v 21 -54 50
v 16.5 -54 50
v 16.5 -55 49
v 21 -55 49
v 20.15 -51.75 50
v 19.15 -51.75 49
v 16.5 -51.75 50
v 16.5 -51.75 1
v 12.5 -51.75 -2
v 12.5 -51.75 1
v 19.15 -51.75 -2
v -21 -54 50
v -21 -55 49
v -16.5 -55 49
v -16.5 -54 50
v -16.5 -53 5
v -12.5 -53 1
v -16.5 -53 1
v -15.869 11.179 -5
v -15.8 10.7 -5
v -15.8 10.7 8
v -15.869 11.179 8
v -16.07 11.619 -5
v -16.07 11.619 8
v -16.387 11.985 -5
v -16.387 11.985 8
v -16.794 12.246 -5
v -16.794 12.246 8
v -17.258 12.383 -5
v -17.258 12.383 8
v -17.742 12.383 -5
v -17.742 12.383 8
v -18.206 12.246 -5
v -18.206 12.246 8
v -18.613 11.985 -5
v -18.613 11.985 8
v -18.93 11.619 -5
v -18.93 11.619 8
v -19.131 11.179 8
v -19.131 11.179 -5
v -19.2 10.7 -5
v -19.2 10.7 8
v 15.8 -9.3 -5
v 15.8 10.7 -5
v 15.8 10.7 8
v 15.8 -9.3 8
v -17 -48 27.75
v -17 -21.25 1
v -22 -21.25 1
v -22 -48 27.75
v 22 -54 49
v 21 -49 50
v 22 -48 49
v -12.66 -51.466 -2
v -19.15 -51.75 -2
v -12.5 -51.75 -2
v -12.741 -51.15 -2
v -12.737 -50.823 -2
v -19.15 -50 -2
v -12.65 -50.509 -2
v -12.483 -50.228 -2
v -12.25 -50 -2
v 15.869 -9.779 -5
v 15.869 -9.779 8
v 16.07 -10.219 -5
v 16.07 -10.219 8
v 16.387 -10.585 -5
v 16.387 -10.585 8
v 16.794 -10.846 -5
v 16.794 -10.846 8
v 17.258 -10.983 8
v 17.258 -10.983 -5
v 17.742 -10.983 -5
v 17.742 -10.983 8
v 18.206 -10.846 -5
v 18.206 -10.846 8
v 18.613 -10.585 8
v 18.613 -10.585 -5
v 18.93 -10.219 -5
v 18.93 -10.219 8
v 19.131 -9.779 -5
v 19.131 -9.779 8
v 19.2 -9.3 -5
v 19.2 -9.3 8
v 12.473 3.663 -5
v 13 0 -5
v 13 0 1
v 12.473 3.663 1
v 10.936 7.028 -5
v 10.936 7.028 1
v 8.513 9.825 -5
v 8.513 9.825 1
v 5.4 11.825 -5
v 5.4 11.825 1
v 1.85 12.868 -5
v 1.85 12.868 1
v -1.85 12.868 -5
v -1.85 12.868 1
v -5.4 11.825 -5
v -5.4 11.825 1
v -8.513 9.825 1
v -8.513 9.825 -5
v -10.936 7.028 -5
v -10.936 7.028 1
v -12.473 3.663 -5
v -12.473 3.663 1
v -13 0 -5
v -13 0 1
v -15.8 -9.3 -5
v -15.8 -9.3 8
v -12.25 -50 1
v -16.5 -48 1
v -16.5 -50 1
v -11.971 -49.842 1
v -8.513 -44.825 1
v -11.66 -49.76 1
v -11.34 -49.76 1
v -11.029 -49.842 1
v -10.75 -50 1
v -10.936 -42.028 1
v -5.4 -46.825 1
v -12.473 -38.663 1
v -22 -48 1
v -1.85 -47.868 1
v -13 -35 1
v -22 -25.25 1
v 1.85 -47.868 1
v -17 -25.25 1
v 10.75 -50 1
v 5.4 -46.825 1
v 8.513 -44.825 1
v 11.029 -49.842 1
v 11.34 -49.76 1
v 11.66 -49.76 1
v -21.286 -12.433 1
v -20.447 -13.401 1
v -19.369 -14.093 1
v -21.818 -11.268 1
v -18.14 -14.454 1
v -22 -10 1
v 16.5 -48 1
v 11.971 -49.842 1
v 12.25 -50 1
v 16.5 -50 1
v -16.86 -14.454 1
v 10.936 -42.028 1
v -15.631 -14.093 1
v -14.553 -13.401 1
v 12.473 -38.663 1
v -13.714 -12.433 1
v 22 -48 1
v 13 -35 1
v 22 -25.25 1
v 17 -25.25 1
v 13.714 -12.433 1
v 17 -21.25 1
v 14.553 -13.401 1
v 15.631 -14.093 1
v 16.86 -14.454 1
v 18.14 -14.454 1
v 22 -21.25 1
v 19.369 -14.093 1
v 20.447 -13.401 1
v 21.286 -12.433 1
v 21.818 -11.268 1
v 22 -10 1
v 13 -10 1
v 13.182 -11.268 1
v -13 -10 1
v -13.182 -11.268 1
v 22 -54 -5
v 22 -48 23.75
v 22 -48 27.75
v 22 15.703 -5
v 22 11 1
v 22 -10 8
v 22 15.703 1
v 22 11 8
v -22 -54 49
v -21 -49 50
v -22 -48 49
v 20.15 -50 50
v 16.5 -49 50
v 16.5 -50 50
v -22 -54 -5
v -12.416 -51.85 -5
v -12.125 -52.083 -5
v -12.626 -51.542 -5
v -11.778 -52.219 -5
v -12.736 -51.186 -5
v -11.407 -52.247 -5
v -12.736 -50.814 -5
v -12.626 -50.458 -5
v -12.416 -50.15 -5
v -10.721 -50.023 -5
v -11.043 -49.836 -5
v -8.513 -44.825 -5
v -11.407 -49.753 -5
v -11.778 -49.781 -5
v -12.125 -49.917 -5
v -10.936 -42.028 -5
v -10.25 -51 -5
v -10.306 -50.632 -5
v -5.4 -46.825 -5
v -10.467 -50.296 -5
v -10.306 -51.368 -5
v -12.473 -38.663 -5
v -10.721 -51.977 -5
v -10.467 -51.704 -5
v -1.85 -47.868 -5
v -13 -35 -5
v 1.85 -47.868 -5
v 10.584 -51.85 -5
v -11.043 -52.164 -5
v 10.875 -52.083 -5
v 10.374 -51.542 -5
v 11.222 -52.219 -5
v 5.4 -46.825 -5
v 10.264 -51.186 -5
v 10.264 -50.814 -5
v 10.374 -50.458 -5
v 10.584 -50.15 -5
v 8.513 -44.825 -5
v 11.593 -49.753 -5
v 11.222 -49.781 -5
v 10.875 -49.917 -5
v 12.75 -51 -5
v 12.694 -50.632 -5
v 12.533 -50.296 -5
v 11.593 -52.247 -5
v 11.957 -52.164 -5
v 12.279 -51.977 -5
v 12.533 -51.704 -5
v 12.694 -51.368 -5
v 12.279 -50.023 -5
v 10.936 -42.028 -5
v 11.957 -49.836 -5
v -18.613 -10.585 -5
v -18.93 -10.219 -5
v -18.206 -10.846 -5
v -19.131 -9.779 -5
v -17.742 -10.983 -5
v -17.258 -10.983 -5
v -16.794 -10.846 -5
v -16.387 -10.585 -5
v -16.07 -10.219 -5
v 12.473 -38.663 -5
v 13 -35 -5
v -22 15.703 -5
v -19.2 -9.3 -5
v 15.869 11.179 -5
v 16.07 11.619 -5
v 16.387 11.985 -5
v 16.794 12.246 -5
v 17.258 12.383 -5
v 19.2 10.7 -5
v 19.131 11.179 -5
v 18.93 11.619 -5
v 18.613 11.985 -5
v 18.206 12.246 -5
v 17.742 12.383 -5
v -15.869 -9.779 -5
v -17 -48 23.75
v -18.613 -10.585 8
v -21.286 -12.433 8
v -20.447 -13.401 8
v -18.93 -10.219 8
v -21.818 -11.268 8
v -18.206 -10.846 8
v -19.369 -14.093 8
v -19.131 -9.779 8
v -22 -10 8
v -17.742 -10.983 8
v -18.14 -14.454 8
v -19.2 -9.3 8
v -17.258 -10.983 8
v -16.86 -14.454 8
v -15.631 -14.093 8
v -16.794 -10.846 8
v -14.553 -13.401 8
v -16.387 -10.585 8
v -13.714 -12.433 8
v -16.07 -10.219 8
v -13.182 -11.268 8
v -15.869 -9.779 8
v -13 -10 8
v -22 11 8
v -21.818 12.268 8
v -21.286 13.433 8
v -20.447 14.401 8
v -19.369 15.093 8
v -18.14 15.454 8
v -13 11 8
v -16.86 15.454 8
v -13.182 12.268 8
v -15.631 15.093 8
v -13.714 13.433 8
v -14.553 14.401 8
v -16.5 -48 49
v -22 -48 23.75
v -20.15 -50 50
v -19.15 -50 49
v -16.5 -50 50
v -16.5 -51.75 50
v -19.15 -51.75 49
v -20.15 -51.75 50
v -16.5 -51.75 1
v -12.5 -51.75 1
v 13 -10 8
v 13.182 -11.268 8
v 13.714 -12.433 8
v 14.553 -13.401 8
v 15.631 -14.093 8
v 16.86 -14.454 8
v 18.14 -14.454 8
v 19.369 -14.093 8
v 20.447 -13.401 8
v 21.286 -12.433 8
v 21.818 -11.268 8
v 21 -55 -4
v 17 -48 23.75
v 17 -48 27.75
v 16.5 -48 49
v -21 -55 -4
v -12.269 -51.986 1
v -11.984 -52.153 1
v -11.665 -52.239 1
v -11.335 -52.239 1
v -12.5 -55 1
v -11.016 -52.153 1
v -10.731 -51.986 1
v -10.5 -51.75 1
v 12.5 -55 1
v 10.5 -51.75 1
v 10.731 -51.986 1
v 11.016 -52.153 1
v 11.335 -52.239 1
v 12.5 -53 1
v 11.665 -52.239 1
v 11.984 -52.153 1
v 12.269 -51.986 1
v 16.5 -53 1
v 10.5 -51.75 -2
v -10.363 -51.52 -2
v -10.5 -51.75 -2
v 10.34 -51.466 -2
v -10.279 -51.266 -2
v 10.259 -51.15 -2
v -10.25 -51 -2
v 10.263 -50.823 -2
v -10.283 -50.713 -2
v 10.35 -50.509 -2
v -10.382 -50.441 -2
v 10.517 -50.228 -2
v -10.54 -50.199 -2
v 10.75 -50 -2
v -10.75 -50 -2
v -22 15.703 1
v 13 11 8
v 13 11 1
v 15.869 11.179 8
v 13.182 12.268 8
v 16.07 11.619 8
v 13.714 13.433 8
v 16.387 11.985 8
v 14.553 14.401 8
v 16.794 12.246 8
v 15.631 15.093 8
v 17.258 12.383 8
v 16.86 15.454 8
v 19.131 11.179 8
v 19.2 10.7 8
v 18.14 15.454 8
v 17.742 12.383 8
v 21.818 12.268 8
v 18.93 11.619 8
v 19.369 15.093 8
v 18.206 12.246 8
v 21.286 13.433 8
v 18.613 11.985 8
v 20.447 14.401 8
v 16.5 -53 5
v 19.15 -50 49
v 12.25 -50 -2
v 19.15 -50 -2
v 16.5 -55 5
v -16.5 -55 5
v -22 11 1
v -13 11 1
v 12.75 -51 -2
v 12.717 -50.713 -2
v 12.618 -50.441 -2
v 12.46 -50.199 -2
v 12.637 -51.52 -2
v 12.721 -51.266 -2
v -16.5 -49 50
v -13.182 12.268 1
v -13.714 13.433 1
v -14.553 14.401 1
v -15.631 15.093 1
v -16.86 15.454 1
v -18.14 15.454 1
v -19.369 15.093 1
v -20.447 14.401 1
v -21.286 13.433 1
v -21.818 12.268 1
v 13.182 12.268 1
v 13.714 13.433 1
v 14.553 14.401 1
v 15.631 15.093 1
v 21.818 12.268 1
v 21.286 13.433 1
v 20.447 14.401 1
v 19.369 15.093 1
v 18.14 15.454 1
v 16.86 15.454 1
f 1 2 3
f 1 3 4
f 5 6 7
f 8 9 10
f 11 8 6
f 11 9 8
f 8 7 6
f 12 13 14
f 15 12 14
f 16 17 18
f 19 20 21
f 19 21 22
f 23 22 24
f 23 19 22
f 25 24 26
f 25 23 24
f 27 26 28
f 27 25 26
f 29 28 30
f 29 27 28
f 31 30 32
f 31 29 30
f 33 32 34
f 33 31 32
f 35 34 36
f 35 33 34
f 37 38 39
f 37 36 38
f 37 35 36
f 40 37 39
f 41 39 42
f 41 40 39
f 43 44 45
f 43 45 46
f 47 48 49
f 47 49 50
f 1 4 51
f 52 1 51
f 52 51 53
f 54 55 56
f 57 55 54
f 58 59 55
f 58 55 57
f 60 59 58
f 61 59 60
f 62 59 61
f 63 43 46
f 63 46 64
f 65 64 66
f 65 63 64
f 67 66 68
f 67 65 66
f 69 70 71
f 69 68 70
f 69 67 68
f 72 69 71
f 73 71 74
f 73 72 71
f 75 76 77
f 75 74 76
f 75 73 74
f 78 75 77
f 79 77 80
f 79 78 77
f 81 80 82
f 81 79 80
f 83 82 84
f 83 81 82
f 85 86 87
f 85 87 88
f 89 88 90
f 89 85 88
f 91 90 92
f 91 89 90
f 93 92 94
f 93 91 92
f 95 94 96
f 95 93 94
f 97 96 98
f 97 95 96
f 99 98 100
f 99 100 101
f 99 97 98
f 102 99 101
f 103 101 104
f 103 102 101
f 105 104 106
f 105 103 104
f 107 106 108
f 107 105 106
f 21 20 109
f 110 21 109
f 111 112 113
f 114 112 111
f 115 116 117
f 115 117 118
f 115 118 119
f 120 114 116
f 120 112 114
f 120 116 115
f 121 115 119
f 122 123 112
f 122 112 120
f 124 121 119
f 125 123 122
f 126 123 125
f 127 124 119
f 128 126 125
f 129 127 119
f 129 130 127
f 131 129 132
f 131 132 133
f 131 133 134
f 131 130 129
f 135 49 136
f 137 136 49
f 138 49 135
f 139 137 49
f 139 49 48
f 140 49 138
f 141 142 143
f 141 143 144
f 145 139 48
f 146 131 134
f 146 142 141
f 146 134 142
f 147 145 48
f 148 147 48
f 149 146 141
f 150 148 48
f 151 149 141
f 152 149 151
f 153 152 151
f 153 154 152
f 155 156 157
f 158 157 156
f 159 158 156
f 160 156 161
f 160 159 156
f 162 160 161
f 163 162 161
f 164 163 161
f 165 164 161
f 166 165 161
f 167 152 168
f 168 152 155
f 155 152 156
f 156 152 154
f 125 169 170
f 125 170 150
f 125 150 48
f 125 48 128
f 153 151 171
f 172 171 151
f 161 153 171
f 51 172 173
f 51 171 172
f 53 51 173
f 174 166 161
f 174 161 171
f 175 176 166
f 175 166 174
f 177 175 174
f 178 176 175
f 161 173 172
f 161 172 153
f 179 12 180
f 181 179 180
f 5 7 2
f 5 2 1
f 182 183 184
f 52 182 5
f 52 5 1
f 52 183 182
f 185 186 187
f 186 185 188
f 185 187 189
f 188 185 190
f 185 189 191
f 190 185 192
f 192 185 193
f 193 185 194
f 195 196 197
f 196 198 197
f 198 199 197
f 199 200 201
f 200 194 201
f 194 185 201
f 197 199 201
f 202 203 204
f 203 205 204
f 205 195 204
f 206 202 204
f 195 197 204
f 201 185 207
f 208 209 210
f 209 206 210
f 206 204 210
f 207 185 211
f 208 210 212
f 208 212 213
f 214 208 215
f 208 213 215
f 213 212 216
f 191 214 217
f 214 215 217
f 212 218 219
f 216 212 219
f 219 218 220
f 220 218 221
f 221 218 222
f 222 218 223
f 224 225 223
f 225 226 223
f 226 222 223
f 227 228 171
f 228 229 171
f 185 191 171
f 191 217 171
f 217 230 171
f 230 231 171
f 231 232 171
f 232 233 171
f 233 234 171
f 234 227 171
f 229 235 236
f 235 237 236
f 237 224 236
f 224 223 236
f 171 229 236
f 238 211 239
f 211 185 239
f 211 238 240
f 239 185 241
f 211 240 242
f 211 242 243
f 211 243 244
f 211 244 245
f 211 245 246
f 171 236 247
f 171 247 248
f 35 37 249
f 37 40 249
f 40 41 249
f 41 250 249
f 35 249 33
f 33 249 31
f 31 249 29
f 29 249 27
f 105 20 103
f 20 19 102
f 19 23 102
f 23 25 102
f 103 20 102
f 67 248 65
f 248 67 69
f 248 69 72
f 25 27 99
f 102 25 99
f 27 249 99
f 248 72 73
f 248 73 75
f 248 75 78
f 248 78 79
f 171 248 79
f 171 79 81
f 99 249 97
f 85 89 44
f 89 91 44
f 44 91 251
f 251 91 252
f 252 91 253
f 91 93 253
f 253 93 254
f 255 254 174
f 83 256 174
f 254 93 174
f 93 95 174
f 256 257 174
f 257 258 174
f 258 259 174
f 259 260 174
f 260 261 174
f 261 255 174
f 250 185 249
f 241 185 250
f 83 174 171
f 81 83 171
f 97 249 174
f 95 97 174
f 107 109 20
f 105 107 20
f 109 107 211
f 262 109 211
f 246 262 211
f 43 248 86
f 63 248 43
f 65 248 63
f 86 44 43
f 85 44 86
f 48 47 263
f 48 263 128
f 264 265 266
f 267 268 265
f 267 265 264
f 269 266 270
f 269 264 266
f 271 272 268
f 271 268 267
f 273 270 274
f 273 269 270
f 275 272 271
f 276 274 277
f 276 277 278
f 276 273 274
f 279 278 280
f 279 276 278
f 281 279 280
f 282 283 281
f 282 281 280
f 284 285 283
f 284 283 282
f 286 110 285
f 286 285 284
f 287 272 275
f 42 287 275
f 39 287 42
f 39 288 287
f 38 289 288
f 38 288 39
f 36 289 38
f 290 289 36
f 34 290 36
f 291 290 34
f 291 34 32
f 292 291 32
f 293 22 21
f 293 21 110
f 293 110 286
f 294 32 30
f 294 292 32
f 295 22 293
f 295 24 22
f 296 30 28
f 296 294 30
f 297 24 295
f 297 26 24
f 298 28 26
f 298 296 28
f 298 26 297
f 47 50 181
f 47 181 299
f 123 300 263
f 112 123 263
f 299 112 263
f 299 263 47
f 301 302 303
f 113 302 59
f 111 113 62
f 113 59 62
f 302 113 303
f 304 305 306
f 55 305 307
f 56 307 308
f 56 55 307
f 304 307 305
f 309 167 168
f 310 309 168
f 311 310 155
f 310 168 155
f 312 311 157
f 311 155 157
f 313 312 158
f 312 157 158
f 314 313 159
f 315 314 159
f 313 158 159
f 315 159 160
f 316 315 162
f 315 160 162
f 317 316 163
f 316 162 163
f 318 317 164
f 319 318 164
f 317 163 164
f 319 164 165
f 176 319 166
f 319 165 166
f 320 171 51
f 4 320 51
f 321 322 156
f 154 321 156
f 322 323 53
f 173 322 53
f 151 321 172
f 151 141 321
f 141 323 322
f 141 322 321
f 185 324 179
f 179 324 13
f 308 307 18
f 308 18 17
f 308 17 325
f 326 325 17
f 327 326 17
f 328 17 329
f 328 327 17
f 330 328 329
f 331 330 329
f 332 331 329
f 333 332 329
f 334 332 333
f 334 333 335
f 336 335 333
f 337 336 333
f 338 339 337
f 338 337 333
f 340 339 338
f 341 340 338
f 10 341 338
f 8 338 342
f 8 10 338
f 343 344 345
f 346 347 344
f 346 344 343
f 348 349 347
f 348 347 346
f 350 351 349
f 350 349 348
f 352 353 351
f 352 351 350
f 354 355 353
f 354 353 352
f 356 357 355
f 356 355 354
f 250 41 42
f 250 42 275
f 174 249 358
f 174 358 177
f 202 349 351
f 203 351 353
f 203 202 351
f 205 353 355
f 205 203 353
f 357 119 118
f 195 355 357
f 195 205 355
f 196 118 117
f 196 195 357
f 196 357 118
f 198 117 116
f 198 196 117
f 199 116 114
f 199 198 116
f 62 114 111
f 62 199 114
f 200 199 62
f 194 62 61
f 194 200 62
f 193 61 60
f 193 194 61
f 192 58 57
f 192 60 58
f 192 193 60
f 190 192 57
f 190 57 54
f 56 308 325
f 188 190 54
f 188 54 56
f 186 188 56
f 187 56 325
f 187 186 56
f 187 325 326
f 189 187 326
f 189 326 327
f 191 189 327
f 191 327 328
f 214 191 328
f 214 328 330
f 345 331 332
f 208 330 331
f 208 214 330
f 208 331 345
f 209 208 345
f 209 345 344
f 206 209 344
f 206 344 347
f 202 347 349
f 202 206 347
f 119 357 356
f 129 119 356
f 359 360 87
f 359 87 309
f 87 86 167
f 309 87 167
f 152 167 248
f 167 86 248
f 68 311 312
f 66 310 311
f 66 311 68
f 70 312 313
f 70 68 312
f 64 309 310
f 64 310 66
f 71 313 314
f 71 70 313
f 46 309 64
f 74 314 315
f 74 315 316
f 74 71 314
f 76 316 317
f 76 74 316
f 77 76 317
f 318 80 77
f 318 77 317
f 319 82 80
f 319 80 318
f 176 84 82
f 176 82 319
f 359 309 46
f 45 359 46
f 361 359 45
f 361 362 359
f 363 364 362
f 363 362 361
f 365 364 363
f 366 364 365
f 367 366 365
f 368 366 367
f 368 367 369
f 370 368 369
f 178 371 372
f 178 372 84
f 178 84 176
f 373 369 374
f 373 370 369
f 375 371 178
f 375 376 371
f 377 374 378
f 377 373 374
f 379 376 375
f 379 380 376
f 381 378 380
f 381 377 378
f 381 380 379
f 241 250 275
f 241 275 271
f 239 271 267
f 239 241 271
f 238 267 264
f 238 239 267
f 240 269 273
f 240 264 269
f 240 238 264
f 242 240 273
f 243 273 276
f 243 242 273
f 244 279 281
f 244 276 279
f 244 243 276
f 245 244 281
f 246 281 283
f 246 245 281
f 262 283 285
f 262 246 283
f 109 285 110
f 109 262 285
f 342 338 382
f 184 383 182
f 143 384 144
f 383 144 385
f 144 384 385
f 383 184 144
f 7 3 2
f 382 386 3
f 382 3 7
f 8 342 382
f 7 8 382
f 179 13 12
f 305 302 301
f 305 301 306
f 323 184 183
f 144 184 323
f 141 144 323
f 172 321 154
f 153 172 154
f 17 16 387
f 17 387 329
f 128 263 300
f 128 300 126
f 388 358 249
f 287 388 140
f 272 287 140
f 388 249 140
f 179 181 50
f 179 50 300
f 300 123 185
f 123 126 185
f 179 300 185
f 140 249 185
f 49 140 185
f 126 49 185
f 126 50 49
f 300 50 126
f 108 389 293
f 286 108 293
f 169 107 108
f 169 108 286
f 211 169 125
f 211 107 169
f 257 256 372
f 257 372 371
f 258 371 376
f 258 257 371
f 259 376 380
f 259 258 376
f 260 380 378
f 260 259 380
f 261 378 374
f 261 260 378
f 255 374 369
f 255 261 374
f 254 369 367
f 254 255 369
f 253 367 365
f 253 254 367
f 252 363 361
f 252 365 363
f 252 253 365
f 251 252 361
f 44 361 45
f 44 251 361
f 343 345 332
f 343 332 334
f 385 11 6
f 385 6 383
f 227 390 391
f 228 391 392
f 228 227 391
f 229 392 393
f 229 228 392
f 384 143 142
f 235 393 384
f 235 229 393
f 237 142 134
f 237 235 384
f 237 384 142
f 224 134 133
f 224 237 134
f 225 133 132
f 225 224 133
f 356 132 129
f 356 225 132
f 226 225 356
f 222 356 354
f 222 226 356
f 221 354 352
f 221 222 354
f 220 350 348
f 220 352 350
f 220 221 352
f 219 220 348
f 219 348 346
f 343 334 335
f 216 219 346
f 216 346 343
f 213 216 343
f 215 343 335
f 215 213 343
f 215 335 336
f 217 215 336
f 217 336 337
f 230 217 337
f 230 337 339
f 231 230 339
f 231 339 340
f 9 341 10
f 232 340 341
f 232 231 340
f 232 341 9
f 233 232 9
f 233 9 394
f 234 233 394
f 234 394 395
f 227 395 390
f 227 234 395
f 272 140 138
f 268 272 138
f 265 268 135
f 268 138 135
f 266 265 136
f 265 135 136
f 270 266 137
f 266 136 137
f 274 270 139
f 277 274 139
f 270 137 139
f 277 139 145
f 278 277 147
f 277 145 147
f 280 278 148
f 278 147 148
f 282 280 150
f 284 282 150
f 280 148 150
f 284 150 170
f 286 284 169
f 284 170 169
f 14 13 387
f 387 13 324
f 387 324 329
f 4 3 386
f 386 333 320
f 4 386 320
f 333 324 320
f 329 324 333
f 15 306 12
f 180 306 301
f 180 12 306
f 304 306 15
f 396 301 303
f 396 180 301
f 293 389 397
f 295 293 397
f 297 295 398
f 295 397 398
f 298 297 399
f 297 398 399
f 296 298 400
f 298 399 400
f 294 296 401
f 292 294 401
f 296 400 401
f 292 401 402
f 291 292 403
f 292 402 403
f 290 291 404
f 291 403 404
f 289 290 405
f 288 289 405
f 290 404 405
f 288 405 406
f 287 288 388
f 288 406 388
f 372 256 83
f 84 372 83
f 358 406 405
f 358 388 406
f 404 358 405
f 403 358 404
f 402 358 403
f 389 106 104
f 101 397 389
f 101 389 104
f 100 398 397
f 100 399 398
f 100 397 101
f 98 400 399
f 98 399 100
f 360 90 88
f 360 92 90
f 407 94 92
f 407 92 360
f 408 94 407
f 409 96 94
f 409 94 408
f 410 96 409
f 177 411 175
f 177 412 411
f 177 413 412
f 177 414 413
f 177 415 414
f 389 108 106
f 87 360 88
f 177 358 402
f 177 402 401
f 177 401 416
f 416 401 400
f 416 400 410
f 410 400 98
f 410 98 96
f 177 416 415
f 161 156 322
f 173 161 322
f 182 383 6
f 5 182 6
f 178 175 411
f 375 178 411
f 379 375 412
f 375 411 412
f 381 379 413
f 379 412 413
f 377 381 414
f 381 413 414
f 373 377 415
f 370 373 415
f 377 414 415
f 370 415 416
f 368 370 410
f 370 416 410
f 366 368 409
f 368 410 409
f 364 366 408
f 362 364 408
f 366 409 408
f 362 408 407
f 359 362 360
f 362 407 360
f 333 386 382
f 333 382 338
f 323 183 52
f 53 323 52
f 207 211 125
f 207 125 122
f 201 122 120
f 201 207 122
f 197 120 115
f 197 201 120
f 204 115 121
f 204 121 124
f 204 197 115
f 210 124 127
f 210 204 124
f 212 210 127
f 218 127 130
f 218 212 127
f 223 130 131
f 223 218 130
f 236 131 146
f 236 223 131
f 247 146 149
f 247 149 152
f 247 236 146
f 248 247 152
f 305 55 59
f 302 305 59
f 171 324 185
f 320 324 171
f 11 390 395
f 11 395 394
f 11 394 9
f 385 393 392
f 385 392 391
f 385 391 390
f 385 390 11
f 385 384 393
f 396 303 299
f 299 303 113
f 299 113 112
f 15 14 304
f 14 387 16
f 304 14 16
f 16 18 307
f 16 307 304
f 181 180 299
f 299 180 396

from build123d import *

# Parameters (mm, degrees)
SKETCH004_W     = 44
SKETCH004_H     = 70.703306
PAD003_DEPTH    = 6
SKETCH006_W     = 5.5
SKETCH006_H     = 7
PAD004_DEPTH    = 50
PAD007_DEPTH    = 5
PAD008_DEPTH    = 5
SKETCH014_R     = 1.25
HOLE003_DEPTH   = 10
PAD010_DEPTH    = 7
POCKET_DEPTH    = 20
SKETCH017_W     = 38.3
SKETCH017_H     = 1.75
POCKET001_DEPTH = 60
CHAMFER003_SIZE = 1
PAD011_DEPTH    = 1


with BuildPart() as part:
    # Sketch004 → Pad003 (new body)
    with BuildSketch(Plane.XY.offset(-5)):
        with Locations((0, -19.648347)):
            Rectangle(SKETCH004_W, SKETCH004_H)
        with BuildLine():
            ThreePointArc((-13, -35), (0, -48), (13, -35))
            Line((13, -35), (13, 0))
            ThreePointArc((13, 0), (0, 13), (-13, 0))
            Line((-13, -35), (-13, 0))
        make_face(mode=Mode.SUBTRACT)
    extrude(amount=PAD003_DEPTH)

    # Sketch006 → Pad004 (join)
    with BuildSketch(Plane.XY):
        with Locations((-19.25, -51.5)):
            Rectangle(SKETCH006_W, SKETCH006_H)
        with Locations((19.25, -51.5)):
            Rectangle(SKETCH006_W, SKETCH006_H)
    extrude(amount=PAD004_DEPTH)

    # Sketch011 → Pad007 (join)
    with BuildSketch(Plane(origin=(17, 0, -4), x_dir=(0, 1, 0), z_dir=(1, 0, 0))):
        Polygon((-21.25, 5), (-48.25, 32), (-48.25, 28), (-25.25, 5), align=None)
    extrude(amount=PAD007_DEPTH)

    # Sketch012 → Pad008 (join)
    with BuildSketch(Plane(origin=(-17, 0, -4), x_dir=(0, 1, 0), z_dir=(1, 0, 0))):
        Polygon((-48.25, 32), (-48.25, 28), (-25.25, 5), (-21.25, 5), align=None)
    extrude(amount=-PAD008_DEPTH)

    # Sketch014 → Hole003 (cut)
    with BuildSketch(Plane.XY.offset(-5)):
        with Locations((-11.5, -51)):
            Circle(SKETCH014_R)
        with Locations((11.5, -51)):
            Circle(SKETCH014_R)
    extrude(amount=HOLE003_DEPTH, mode=Mode.SUBTRACT)

    # Sketch016 → Pad010 (join)
    with BuildSketch(Plane.XY.offset(1)):
        with BuildLine():
            ThreePointArc((-13, 11), (-17.5, 15.5), (-22, 11))
            Line((-22, 11), (-22, -10))
            ThreePointArc((-22, -10), (-17.5, -14.5), (-13, -10))
            Line((-13, 11), (-13, -10))
        make_face()
        with BuildLine():
            ThreePointArc((22, 11), (17.5, 15.5), (13, 11))
            Line((13, 11), (13, -10))
            ThreePointArc((13, -10), (17.5, -14.5), (22, -10))
            Line((22, 11), (22, -10))
        make_face()
    extrude(amount=PAD010_DEPTH)

    # Sketch015 → Pocket (cut)
    with BuildSketch(Plane.XY.offset(-5)):
        with BuildLine():
            ThreePointArc((-15.8, 10.7), (-17.5, 12.4), (-19.2, 10.7))
            Line((-19.2, 10.7), (-19.2, -9.3))
            ThreePointArc((-19.2, -9.3), (-17.5, -11), (-15.8, -9.3))
            Line((-15.8, 10.7), (-15.8, -9.3))
        make_face()
        with BuildLine():
            ThreePointArc((19.2, 10.7), (17.5, 12.4), (15.8, 10.7))
            Line((15.8, 10.7), (15.8, -9.3))
            ThreePointArc((15.8, -9.3), (17.5, -11), (19.2, -9.3))
            Line((19.2, 10.7), (19.2, -9.3))
        make_face()
    extrude(amount=POCKET_DEPTH, mode=Mode.SUBTRACT)

    # Sketch017 → Pocket001 (cut)
    with BuildSketch(Plane.XY.offset(-2)):
        with Locations((0, -50.875)):
            Rectangle(SKETCH017_W, SKETCH017_H)
    extrude(amount=POCKET001_DEPTH, mode=Mode.SUBTRACT)

    # Chamfer003
    chamfer003_edges = [part.edges().sort_by_distance(p)[0] for p in [
        (-22, -55, 0.5),
        (-22, -55, 25.5),
        (22, -55, 0.5),
        (22, -55, 25.5),
        (-19.25, -55, 50),
        (-22, -51.5, 50),
        (-19.25, -48, 50),
        (19.25, -55, 50),
        (22, -51.5, 50),
        (19.25, -48, 50),
        (-19.15, -50.875, 50),
        (19.15, -50.875, 50),
        (0, -55, -5),
    ]]
    chamfer(chamfer003_edges, length=CHAMFER003_SIZE)

    # Sketch018 → Pad011 (join, symmetric)
    with BuildSketch(Plane.XZ.offset(54)):
        Polygon((-16.5, 0), (-16.5, 5), (-11.5, 0), align=None)
        Polygon((16.5, 0), (16.5, 5), (11.5, 0), align=None)
    extrude(amount=PAD011_DEPTH, both=True)


solid = part.part
